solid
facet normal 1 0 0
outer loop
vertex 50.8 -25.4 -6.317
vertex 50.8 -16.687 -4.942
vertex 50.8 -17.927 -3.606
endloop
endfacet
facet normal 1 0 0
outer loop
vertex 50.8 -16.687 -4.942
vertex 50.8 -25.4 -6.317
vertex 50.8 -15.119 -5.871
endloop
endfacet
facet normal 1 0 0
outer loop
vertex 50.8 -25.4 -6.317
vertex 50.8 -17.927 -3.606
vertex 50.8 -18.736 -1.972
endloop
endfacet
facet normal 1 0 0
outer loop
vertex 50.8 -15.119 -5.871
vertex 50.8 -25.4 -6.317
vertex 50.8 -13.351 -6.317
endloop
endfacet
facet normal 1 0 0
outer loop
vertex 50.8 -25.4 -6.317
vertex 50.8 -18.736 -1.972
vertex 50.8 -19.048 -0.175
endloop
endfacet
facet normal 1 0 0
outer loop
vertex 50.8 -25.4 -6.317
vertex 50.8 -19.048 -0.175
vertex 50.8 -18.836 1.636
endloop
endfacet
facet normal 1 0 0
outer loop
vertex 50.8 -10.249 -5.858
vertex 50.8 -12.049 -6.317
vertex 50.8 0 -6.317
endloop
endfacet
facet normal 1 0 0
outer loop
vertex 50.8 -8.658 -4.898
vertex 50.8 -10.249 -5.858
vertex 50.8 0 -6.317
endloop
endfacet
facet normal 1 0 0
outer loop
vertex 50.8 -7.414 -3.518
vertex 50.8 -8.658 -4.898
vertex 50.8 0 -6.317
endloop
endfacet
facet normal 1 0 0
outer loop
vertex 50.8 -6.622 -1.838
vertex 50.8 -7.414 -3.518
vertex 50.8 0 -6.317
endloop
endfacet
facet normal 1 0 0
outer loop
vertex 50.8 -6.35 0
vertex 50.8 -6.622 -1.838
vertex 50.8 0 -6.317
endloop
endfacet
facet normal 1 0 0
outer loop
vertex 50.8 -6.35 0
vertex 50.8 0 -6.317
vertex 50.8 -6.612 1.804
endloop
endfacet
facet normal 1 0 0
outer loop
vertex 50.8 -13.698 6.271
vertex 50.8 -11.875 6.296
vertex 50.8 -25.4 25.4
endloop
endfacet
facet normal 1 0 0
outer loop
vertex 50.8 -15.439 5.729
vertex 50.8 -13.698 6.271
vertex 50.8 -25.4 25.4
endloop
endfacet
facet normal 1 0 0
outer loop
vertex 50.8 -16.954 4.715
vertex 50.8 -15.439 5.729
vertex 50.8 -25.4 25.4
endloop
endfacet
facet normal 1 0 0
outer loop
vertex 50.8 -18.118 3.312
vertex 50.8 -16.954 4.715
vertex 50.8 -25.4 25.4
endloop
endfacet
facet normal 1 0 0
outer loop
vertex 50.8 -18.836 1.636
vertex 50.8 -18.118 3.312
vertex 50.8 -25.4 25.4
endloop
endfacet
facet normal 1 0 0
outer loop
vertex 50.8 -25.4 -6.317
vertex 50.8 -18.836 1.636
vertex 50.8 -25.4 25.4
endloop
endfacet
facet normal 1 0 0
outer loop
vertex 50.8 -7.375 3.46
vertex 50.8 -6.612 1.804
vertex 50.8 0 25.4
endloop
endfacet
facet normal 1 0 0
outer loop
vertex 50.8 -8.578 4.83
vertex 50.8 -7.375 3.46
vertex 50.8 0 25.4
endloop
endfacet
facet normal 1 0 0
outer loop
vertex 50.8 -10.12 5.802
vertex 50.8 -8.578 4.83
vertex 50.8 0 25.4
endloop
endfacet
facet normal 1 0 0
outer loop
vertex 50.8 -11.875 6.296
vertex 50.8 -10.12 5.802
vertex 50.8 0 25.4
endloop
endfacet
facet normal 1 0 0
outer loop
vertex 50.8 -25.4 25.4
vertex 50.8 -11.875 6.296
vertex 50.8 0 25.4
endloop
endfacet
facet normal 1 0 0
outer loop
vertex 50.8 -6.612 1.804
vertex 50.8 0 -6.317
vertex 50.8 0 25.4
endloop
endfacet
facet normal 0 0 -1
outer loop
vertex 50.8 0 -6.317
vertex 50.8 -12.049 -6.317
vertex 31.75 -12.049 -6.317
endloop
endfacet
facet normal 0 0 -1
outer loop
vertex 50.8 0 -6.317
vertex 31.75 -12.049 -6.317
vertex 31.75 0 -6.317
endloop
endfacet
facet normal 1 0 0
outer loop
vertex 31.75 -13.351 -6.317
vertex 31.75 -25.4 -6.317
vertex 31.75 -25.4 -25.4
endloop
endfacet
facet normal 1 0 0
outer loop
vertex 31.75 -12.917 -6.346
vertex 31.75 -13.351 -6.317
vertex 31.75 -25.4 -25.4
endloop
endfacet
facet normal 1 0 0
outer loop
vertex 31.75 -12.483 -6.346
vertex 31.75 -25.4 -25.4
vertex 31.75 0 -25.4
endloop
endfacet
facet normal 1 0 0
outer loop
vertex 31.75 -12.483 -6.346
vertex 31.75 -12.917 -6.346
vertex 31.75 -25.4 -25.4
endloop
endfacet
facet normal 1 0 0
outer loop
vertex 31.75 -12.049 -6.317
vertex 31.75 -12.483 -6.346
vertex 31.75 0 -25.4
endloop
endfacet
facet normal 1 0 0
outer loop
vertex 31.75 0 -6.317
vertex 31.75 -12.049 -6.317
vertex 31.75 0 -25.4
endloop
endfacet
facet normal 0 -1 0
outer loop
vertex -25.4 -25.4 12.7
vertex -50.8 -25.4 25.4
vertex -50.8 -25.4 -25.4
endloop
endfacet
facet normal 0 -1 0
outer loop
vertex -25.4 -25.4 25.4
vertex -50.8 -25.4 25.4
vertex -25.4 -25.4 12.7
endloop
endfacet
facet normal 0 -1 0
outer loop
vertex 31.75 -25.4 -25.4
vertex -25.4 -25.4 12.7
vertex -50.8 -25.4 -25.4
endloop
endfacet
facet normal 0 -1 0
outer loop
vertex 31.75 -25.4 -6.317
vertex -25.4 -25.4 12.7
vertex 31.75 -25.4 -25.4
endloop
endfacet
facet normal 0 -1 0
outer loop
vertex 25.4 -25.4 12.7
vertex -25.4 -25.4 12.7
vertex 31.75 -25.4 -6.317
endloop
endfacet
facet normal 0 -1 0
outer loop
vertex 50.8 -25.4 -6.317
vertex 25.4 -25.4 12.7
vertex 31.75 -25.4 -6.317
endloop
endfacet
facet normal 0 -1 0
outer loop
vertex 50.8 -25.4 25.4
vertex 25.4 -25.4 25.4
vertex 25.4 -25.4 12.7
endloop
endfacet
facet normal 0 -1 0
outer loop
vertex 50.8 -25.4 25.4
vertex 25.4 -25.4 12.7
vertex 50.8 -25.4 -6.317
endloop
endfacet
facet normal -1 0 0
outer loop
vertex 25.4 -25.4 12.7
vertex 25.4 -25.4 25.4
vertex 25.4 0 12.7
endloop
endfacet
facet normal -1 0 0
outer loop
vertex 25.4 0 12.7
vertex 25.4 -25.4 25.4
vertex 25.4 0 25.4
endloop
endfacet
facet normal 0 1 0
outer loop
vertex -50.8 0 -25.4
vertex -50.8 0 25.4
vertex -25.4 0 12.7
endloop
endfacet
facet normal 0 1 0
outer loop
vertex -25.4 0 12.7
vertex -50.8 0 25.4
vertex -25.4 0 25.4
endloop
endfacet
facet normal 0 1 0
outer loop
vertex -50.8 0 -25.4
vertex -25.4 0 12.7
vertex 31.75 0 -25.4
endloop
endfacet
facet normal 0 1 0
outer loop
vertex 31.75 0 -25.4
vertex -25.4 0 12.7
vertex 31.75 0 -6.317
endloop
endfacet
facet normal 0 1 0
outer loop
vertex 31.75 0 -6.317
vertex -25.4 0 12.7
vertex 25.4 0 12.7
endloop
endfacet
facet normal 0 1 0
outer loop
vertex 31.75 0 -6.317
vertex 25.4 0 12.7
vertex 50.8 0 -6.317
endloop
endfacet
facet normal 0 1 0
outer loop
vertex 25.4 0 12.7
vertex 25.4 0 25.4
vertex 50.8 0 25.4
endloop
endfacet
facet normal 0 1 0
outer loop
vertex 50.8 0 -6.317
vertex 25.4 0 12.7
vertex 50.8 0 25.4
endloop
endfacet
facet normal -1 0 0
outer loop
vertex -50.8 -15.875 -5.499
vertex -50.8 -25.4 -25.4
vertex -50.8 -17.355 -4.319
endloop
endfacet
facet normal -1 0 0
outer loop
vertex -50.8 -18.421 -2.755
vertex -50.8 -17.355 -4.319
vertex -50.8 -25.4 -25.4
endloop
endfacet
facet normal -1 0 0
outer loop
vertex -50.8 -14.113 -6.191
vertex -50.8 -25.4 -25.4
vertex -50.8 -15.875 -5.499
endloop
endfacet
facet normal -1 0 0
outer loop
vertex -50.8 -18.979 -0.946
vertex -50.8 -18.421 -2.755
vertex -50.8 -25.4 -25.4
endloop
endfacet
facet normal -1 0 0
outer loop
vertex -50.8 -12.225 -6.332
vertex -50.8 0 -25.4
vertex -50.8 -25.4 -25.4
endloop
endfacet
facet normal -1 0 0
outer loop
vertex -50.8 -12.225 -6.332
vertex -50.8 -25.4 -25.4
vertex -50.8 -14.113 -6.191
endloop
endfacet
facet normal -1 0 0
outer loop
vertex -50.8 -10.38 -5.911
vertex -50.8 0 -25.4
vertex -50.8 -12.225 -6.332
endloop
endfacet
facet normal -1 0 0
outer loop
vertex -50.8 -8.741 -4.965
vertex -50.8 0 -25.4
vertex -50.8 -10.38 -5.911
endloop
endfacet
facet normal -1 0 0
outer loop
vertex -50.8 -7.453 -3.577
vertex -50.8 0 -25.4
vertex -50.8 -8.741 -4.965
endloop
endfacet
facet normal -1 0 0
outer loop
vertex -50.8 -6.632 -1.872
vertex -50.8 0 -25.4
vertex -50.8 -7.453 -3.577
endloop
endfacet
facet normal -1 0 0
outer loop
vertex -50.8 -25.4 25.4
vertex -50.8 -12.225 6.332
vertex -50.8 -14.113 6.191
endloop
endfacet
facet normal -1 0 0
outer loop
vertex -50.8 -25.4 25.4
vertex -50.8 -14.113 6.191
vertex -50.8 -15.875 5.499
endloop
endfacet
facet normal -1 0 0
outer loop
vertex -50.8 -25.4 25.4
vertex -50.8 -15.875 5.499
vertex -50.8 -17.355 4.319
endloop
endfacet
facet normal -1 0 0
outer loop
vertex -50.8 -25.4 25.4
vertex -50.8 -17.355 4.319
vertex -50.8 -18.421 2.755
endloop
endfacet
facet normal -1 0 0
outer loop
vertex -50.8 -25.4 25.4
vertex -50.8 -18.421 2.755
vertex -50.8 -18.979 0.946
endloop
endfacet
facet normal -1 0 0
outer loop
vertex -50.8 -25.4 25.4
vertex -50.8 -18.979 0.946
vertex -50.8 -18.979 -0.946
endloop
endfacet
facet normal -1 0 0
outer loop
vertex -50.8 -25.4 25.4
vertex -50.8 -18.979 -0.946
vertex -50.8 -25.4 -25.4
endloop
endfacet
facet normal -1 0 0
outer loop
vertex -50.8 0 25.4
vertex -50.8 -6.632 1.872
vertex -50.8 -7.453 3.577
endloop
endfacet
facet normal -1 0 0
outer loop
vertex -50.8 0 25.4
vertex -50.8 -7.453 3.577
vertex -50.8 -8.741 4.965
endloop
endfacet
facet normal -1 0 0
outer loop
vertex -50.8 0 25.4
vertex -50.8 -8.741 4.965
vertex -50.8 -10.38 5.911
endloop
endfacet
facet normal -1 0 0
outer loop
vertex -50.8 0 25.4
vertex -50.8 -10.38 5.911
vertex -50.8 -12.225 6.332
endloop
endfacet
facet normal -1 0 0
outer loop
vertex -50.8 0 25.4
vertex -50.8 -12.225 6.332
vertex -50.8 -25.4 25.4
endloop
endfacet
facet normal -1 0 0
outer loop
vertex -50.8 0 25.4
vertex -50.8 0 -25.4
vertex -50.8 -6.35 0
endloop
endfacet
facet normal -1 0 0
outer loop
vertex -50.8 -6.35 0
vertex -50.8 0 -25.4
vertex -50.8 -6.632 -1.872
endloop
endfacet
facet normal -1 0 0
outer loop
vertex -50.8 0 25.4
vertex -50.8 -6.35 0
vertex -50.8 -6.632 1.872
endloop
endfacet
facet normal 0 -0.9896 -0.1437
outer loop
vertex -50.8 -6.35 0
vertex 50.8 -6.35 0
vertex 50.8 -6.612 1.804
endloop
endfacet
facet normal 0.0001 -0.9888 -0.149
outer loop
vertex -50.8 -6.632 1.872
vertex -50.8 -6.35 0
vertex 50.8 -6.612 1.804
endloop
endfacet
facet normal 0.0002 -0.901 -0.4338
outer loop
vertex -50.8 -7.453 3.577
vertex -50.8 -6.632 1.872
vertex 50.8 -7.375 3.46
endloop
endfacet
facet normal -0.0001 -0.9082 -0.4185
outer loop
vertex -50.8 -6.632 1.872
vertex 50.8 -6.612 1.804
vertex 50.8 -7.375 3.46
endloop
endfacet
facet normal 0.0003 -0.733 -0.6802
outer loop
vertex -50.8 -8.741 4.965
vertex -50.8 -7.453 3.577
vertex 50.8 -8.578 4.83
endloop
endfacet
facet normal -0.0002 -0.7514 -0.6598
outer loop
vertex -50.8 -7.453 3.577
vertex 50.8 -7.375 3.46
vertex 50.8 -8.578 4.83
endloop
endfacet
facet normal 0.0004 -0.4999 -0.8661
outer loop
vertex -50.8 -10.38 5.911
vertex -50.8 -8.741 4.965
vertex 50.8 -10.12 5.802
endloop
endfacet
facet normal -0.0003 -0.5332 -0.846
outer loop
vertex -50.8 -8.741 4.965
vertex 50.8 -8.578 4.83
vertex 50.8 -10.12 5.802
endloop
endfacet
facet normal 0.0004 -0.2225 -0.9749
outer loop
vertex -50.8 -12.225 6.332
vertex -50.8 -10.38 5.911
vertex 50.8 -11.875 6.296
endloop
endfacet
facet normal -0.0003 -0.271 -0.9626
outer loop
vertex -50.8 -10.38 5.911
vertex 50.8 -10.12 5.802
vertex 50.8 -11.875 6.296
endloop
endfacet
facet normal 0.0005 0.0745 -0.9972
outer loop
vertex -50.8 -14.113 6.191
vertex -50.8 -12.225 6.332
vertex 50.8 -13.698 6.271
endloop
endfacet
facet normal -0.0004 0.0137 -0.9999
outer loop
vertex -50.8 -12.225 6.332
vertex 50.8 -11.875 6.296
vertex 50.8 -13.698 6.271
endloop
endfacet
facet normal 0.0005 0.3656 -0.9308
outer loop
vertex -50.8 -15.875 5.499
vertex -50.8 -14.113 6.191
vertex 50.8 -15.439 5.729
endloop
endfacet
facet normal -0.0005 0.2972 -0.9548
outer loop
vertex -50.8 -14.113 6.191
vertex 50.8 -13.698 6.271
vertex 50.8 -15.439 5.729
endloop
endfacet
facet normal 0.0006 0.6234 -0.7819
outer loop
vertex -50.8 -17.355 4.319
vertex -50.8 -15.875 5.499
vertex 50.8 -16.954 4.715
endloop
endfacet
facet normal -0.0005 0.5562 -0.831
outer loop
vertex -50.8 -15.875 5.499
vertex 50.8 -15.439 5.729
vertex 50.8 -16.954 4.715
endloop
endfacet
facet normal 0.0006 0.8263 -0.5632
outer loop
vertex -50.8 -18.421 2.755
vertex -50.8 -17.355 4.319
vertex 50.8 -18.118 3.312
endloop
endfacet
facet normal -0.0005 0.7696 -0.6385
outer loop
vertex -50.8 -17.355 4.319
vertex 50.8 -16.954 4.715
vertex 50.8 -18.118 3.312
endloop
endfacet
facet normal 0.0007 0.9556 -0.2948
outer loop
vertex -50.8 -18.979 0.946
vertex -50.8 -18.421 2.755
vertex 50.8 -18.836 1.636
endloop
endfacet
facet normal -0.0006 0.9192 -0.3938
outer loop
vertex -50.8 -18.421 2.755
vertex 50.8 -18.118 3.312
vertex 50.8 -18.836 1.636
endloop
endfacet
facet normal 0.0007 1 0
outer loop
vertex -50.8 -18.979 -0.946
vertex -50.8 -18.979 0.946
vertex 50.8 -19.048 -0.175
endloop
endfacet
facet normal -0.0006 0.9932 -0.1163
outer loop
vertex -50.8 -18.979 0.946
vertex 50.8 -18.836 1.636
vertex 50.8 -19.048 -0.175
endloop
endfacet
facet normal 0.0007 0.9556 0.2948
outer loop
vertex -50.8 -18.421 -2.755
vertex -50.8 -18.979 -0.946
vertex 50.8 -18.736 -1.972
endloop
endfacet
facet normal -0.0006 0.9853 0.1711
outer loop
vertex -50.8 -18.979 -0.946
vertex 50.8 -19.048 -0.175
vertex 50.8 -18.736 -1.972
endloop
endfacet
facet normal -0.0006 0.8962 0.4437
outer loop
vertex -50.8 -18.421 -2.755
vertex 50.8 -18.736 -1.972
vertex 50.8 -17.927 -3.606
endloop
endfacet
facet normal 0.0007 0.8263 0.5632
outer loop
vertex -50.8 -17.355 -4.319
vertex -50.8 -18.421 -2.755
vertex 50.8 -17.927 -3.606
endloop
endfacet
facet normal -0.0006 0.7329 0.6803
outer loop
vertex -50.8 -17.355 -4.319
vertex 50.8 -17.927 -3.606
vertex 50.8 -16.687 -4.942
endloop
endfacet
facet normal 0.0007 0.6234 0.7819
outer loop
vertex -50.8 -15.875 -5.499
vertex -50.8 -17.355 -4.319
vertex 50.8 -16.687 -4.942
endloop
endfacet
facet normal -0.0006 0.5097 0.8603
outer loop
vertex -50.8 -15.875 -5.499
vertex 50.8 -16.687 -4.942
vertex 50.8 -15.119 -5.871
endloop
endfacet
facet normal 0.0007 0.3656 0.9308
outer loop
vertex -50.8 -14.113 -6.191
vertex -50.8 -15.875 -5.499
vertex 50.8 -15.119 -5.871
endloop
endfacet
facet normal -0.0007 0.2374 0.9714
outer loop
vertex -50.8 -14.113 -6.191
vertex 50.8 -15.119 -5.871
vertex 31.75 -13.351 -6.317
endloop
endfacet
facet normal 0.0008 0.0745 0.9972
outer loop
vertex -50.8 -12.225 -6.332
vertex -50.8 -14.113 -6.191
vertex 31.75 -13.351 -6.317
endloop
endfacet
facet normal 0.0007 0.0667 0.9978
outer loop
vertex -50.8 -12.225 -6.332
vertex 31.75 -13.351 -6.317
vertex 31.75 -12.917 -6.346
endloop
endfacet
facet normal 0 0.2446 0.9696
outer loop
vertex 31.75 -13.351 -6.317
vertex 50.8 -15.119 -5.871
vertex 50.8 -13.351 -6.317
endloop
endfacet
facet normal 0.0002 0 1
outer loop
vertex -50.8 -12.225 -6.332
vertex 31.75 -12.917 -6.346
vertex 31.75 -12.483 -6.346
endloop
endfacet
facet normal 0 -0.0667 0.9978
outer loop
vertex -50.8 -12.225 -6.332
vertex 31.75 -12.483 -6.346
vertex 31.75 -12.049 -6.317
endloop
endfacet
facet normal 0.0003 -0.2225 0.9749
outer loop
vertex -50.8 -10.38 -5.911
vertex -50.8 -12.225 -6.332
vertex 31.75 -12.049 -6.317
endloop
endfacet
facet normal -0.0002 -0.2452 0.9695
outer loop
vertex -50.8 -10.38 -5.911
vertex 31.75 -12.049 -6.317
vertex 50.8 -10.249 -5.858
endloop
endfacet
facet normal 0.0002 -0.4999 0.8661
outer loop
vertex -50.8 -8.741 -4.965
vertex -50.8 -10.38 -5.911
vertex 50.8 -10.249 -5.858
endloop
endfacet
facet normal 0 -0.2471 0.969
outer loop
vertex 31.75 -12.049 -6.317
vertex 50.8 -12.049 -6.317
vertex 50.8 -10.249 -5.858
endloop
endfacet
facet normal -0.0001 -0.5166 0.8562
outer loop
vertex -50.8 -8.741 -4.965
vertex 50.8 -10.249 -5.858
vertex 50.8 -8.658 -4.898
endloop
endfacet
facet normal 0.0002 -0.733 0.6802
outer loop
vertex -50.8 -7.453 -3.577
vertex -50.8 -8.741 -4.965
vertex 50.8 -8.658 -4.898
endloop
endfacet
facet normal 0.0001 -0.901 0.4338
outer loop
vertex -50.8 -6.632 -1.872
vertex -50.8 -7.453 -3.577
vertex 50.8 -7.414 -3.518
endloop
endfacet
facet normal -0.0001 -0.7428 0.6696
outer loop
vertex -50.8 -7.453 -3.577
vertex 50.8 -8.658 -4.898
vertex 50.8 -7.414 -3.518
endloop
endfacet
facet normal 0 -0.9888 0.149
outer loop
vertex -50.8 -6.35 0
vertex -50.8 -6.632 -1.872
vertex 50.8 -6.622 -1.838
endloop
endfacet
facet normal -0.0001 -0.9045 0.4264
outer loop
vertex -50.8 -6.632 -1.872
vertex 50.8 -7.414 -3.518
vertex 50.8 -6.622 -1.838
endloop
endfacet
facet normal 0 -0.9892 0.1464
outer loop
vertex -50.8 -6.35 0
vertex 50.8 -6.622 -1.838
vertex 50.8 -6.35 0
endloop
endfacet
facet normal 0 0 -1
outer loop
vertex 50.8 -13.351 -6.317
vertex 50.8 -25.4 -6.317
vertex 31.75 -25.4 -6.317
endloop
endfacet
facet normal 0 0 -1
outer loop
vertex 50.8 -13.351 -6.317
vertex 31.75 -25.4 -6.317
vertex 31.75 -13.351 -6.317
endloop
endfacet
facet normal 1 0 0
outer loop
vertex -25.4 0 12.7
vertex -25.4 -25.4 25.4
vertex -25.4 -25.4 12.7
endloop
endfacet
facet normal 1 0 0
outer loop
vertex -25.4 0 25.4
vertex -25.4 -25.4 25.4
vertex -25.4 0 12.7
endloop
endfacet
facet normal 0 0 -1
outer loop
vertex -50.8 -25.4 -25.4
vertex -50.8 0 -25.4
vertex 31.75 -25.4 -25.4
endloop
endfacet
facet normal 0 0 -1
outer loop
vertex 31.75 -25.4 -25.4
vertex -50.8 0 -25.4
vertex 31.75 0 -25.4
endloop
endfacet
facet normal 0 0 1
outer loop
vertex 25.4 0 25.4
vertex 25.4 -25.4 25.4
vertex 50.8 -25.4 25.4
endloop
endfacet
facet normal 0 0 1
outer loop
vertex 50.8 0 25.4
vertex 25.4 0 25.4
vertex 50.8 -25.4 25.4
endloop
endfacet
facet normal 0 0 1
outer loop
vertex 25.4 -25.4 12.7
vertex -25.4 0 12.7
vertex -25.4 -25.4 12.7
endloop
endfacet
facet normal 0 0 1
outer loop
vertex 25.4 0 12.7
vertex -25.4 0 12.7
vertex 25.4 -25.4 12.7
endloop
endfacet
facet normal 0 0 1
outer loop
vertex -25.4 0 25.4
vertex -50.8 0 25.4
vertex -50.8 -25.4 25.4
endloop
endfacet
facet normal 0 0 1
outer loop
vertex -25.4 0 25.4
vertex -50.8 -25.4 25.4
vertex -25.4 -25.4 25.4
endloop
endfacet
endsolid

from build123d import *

# Parameters (mm, degrees)
F0_W     = 101.6
F0_H     = 50.8
F1_DEPTH = 25.4
F2_W     = 25.4
F2_H     = 19.083421053
F3_DEPTH = 19.05
F4_W     = 50.8
F4_H     = 25.4
F5_DEPTH = 12.7
F6_R     = 6.35
F7_DEPTH = 101.601


with BuildPart() as f1:
    # F0 (on Front) → F1 (new body)
    with BuildSketch(Plane.XZ):
        Rectangle(F0_W, F0_H)
    extrude(amount=F1_DEPTH)

    # F2 (on face) → F3 (cut)
    with BuildSketch(Plane.YZ.offset(50.8)):
        with Locations((-12.7, -15.8582894735)):
            Rectangle(F2_W, F2_H)
    extrude(amount=-F3_DEPTH, mode=Mode.SUBTRACT)

    # F4 (on face) → F5 (cut)
    with BuildSketch(Plane.XY.offset(25.4)):
        with Locations((0, -12.7)):
            Rectangle(F4_W, F4_H)
    extrude(amount=-F5_DEPTH, mode=Mode.SUBTRACT)

    # F6 (on face) → F7 (cut, through all)
    with BuildSketch(Plane.YZ.offset(50.8)):
        with Locations((-12.7, 0)):
            Circle(F6_R)
    extrude(amount=-F7_DEPTH, mode=Mode.SUBTRACT)


solid = f1.part
